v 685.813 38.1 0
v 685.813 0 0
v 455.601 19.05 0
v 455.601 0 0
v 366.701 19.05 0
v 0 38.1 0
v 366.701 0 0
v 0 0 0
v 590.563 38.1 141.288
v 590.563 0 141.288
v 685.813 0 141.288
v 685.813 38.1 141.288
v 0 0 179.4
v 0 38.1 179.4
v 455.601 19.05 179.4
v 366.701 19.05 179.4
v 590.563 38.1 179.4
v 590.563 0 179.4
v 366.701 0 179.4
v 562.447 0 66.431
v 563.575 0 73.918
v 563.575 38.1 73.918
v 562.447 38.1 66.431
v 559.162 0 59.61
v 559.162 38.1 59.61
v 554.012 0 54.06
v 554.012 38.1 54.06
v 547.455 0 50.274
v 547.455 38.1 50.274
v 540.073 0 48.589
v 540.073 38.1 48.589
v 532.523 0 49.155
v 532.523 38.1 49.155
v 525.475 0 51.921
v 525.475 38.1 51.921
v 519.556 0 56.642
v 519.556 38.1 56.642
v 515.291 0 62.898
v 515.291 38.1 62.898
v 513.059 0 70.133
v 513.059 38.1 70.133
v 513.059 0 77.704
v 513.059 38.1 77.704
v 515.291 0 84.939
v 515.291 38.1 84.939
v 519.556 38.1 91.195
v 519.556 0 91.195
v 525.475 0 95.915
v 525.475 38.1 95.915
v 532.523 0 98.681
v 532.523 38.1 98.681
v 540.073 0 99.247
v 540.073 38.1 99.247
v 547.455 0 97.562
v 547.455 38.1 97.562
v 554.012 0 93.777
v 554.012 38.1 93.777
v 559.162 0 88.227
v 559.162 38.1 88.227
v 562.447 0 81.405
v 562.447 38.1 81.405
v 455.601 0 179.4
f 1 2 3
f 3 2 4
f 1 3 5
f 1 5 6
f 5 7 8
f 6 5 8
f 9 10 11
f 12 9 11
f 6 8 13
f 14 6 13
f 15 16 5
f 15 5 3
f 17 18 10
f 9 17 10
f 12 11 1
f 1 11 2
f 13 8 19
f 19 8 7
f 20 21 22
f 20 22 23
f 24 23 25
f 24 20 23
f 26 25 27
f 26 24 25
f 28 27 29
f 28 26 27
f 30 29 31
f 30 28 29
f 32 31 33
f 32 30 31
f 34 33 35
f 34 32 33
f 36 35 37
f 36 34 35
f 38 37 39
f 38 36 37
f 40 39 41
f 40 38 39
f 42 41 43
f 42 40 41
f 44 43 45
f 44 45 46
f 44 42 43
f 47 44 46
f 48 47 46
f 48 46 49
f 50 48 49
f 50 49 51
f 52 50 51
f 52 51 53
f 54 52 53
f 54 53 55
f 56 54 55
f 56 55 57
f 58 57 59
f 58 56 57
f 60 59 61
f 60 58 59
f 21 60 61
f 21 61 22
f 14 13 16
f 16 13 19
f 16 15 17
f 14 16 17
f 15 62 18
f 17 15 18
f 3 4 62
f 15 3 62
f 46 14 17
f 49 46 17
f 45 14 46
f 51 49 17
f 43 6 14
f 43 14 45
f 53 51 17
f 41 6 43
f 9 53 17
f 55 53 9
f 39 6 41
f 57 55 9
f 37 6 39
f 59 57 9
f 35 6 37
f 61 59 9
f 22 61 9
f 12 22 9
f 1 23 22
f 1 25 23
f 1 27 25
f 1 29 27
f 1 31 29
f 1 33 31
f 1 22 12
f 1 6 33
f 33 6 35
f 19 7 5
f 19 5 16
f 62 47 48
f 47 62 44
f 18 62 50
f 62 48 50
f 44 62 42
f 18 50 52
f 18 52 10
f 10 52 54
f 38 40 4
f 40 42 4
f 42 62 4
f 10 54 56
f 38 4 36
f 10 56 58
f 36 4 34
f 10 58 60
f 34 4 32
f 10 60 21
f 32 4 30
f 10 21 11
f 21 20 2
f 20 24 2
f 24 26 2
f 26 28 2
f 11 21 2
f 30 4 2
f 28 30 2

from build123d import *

# Parameters (mm, degrees)
SKETCH1_R           = 25.4
BOSS_EXTRUDE1_DEPTH = 38.1
SKETCH2_W           = 88.9
SKETCH2_H           = 179.4002
CUT_EXTRUDE1_DEPTH  = 19.05


with BuildPart() as part:
    # Sketch1 → Boss-Extrude1 (new body)
    with BuildSketch(Plane(origin=(0, 0, 0), x_dir=(1, 0, 0), z_dir=(0, 1, 0))):
        Polygon((685.8127, 0), (0, 0), (0, -179.4002), (590.5627, -179.4002), (590.5627, -141.2875), (685.8127, -141.2875), align=None)
        with Locations((538.1752, -73.918191)):
            Circle(SKETCH1_R, mode=Mode.SUBTRACT)
    extrude(amount=BOSS_EXTRUDE1_DEPTH)

    # Sketch2 → Cut-Extrude1 (cut)
    with BuildSketch(Plane.XZ):
        with Locations((411.15104079, 89.7001)):
            Rectangle(SKETCH2_W, SKETCH2_H)
    extrude(amount=-CUT_EXTRUDE1_DEPTH, mode=Mode.SUBTRACT)


solid = part.part
